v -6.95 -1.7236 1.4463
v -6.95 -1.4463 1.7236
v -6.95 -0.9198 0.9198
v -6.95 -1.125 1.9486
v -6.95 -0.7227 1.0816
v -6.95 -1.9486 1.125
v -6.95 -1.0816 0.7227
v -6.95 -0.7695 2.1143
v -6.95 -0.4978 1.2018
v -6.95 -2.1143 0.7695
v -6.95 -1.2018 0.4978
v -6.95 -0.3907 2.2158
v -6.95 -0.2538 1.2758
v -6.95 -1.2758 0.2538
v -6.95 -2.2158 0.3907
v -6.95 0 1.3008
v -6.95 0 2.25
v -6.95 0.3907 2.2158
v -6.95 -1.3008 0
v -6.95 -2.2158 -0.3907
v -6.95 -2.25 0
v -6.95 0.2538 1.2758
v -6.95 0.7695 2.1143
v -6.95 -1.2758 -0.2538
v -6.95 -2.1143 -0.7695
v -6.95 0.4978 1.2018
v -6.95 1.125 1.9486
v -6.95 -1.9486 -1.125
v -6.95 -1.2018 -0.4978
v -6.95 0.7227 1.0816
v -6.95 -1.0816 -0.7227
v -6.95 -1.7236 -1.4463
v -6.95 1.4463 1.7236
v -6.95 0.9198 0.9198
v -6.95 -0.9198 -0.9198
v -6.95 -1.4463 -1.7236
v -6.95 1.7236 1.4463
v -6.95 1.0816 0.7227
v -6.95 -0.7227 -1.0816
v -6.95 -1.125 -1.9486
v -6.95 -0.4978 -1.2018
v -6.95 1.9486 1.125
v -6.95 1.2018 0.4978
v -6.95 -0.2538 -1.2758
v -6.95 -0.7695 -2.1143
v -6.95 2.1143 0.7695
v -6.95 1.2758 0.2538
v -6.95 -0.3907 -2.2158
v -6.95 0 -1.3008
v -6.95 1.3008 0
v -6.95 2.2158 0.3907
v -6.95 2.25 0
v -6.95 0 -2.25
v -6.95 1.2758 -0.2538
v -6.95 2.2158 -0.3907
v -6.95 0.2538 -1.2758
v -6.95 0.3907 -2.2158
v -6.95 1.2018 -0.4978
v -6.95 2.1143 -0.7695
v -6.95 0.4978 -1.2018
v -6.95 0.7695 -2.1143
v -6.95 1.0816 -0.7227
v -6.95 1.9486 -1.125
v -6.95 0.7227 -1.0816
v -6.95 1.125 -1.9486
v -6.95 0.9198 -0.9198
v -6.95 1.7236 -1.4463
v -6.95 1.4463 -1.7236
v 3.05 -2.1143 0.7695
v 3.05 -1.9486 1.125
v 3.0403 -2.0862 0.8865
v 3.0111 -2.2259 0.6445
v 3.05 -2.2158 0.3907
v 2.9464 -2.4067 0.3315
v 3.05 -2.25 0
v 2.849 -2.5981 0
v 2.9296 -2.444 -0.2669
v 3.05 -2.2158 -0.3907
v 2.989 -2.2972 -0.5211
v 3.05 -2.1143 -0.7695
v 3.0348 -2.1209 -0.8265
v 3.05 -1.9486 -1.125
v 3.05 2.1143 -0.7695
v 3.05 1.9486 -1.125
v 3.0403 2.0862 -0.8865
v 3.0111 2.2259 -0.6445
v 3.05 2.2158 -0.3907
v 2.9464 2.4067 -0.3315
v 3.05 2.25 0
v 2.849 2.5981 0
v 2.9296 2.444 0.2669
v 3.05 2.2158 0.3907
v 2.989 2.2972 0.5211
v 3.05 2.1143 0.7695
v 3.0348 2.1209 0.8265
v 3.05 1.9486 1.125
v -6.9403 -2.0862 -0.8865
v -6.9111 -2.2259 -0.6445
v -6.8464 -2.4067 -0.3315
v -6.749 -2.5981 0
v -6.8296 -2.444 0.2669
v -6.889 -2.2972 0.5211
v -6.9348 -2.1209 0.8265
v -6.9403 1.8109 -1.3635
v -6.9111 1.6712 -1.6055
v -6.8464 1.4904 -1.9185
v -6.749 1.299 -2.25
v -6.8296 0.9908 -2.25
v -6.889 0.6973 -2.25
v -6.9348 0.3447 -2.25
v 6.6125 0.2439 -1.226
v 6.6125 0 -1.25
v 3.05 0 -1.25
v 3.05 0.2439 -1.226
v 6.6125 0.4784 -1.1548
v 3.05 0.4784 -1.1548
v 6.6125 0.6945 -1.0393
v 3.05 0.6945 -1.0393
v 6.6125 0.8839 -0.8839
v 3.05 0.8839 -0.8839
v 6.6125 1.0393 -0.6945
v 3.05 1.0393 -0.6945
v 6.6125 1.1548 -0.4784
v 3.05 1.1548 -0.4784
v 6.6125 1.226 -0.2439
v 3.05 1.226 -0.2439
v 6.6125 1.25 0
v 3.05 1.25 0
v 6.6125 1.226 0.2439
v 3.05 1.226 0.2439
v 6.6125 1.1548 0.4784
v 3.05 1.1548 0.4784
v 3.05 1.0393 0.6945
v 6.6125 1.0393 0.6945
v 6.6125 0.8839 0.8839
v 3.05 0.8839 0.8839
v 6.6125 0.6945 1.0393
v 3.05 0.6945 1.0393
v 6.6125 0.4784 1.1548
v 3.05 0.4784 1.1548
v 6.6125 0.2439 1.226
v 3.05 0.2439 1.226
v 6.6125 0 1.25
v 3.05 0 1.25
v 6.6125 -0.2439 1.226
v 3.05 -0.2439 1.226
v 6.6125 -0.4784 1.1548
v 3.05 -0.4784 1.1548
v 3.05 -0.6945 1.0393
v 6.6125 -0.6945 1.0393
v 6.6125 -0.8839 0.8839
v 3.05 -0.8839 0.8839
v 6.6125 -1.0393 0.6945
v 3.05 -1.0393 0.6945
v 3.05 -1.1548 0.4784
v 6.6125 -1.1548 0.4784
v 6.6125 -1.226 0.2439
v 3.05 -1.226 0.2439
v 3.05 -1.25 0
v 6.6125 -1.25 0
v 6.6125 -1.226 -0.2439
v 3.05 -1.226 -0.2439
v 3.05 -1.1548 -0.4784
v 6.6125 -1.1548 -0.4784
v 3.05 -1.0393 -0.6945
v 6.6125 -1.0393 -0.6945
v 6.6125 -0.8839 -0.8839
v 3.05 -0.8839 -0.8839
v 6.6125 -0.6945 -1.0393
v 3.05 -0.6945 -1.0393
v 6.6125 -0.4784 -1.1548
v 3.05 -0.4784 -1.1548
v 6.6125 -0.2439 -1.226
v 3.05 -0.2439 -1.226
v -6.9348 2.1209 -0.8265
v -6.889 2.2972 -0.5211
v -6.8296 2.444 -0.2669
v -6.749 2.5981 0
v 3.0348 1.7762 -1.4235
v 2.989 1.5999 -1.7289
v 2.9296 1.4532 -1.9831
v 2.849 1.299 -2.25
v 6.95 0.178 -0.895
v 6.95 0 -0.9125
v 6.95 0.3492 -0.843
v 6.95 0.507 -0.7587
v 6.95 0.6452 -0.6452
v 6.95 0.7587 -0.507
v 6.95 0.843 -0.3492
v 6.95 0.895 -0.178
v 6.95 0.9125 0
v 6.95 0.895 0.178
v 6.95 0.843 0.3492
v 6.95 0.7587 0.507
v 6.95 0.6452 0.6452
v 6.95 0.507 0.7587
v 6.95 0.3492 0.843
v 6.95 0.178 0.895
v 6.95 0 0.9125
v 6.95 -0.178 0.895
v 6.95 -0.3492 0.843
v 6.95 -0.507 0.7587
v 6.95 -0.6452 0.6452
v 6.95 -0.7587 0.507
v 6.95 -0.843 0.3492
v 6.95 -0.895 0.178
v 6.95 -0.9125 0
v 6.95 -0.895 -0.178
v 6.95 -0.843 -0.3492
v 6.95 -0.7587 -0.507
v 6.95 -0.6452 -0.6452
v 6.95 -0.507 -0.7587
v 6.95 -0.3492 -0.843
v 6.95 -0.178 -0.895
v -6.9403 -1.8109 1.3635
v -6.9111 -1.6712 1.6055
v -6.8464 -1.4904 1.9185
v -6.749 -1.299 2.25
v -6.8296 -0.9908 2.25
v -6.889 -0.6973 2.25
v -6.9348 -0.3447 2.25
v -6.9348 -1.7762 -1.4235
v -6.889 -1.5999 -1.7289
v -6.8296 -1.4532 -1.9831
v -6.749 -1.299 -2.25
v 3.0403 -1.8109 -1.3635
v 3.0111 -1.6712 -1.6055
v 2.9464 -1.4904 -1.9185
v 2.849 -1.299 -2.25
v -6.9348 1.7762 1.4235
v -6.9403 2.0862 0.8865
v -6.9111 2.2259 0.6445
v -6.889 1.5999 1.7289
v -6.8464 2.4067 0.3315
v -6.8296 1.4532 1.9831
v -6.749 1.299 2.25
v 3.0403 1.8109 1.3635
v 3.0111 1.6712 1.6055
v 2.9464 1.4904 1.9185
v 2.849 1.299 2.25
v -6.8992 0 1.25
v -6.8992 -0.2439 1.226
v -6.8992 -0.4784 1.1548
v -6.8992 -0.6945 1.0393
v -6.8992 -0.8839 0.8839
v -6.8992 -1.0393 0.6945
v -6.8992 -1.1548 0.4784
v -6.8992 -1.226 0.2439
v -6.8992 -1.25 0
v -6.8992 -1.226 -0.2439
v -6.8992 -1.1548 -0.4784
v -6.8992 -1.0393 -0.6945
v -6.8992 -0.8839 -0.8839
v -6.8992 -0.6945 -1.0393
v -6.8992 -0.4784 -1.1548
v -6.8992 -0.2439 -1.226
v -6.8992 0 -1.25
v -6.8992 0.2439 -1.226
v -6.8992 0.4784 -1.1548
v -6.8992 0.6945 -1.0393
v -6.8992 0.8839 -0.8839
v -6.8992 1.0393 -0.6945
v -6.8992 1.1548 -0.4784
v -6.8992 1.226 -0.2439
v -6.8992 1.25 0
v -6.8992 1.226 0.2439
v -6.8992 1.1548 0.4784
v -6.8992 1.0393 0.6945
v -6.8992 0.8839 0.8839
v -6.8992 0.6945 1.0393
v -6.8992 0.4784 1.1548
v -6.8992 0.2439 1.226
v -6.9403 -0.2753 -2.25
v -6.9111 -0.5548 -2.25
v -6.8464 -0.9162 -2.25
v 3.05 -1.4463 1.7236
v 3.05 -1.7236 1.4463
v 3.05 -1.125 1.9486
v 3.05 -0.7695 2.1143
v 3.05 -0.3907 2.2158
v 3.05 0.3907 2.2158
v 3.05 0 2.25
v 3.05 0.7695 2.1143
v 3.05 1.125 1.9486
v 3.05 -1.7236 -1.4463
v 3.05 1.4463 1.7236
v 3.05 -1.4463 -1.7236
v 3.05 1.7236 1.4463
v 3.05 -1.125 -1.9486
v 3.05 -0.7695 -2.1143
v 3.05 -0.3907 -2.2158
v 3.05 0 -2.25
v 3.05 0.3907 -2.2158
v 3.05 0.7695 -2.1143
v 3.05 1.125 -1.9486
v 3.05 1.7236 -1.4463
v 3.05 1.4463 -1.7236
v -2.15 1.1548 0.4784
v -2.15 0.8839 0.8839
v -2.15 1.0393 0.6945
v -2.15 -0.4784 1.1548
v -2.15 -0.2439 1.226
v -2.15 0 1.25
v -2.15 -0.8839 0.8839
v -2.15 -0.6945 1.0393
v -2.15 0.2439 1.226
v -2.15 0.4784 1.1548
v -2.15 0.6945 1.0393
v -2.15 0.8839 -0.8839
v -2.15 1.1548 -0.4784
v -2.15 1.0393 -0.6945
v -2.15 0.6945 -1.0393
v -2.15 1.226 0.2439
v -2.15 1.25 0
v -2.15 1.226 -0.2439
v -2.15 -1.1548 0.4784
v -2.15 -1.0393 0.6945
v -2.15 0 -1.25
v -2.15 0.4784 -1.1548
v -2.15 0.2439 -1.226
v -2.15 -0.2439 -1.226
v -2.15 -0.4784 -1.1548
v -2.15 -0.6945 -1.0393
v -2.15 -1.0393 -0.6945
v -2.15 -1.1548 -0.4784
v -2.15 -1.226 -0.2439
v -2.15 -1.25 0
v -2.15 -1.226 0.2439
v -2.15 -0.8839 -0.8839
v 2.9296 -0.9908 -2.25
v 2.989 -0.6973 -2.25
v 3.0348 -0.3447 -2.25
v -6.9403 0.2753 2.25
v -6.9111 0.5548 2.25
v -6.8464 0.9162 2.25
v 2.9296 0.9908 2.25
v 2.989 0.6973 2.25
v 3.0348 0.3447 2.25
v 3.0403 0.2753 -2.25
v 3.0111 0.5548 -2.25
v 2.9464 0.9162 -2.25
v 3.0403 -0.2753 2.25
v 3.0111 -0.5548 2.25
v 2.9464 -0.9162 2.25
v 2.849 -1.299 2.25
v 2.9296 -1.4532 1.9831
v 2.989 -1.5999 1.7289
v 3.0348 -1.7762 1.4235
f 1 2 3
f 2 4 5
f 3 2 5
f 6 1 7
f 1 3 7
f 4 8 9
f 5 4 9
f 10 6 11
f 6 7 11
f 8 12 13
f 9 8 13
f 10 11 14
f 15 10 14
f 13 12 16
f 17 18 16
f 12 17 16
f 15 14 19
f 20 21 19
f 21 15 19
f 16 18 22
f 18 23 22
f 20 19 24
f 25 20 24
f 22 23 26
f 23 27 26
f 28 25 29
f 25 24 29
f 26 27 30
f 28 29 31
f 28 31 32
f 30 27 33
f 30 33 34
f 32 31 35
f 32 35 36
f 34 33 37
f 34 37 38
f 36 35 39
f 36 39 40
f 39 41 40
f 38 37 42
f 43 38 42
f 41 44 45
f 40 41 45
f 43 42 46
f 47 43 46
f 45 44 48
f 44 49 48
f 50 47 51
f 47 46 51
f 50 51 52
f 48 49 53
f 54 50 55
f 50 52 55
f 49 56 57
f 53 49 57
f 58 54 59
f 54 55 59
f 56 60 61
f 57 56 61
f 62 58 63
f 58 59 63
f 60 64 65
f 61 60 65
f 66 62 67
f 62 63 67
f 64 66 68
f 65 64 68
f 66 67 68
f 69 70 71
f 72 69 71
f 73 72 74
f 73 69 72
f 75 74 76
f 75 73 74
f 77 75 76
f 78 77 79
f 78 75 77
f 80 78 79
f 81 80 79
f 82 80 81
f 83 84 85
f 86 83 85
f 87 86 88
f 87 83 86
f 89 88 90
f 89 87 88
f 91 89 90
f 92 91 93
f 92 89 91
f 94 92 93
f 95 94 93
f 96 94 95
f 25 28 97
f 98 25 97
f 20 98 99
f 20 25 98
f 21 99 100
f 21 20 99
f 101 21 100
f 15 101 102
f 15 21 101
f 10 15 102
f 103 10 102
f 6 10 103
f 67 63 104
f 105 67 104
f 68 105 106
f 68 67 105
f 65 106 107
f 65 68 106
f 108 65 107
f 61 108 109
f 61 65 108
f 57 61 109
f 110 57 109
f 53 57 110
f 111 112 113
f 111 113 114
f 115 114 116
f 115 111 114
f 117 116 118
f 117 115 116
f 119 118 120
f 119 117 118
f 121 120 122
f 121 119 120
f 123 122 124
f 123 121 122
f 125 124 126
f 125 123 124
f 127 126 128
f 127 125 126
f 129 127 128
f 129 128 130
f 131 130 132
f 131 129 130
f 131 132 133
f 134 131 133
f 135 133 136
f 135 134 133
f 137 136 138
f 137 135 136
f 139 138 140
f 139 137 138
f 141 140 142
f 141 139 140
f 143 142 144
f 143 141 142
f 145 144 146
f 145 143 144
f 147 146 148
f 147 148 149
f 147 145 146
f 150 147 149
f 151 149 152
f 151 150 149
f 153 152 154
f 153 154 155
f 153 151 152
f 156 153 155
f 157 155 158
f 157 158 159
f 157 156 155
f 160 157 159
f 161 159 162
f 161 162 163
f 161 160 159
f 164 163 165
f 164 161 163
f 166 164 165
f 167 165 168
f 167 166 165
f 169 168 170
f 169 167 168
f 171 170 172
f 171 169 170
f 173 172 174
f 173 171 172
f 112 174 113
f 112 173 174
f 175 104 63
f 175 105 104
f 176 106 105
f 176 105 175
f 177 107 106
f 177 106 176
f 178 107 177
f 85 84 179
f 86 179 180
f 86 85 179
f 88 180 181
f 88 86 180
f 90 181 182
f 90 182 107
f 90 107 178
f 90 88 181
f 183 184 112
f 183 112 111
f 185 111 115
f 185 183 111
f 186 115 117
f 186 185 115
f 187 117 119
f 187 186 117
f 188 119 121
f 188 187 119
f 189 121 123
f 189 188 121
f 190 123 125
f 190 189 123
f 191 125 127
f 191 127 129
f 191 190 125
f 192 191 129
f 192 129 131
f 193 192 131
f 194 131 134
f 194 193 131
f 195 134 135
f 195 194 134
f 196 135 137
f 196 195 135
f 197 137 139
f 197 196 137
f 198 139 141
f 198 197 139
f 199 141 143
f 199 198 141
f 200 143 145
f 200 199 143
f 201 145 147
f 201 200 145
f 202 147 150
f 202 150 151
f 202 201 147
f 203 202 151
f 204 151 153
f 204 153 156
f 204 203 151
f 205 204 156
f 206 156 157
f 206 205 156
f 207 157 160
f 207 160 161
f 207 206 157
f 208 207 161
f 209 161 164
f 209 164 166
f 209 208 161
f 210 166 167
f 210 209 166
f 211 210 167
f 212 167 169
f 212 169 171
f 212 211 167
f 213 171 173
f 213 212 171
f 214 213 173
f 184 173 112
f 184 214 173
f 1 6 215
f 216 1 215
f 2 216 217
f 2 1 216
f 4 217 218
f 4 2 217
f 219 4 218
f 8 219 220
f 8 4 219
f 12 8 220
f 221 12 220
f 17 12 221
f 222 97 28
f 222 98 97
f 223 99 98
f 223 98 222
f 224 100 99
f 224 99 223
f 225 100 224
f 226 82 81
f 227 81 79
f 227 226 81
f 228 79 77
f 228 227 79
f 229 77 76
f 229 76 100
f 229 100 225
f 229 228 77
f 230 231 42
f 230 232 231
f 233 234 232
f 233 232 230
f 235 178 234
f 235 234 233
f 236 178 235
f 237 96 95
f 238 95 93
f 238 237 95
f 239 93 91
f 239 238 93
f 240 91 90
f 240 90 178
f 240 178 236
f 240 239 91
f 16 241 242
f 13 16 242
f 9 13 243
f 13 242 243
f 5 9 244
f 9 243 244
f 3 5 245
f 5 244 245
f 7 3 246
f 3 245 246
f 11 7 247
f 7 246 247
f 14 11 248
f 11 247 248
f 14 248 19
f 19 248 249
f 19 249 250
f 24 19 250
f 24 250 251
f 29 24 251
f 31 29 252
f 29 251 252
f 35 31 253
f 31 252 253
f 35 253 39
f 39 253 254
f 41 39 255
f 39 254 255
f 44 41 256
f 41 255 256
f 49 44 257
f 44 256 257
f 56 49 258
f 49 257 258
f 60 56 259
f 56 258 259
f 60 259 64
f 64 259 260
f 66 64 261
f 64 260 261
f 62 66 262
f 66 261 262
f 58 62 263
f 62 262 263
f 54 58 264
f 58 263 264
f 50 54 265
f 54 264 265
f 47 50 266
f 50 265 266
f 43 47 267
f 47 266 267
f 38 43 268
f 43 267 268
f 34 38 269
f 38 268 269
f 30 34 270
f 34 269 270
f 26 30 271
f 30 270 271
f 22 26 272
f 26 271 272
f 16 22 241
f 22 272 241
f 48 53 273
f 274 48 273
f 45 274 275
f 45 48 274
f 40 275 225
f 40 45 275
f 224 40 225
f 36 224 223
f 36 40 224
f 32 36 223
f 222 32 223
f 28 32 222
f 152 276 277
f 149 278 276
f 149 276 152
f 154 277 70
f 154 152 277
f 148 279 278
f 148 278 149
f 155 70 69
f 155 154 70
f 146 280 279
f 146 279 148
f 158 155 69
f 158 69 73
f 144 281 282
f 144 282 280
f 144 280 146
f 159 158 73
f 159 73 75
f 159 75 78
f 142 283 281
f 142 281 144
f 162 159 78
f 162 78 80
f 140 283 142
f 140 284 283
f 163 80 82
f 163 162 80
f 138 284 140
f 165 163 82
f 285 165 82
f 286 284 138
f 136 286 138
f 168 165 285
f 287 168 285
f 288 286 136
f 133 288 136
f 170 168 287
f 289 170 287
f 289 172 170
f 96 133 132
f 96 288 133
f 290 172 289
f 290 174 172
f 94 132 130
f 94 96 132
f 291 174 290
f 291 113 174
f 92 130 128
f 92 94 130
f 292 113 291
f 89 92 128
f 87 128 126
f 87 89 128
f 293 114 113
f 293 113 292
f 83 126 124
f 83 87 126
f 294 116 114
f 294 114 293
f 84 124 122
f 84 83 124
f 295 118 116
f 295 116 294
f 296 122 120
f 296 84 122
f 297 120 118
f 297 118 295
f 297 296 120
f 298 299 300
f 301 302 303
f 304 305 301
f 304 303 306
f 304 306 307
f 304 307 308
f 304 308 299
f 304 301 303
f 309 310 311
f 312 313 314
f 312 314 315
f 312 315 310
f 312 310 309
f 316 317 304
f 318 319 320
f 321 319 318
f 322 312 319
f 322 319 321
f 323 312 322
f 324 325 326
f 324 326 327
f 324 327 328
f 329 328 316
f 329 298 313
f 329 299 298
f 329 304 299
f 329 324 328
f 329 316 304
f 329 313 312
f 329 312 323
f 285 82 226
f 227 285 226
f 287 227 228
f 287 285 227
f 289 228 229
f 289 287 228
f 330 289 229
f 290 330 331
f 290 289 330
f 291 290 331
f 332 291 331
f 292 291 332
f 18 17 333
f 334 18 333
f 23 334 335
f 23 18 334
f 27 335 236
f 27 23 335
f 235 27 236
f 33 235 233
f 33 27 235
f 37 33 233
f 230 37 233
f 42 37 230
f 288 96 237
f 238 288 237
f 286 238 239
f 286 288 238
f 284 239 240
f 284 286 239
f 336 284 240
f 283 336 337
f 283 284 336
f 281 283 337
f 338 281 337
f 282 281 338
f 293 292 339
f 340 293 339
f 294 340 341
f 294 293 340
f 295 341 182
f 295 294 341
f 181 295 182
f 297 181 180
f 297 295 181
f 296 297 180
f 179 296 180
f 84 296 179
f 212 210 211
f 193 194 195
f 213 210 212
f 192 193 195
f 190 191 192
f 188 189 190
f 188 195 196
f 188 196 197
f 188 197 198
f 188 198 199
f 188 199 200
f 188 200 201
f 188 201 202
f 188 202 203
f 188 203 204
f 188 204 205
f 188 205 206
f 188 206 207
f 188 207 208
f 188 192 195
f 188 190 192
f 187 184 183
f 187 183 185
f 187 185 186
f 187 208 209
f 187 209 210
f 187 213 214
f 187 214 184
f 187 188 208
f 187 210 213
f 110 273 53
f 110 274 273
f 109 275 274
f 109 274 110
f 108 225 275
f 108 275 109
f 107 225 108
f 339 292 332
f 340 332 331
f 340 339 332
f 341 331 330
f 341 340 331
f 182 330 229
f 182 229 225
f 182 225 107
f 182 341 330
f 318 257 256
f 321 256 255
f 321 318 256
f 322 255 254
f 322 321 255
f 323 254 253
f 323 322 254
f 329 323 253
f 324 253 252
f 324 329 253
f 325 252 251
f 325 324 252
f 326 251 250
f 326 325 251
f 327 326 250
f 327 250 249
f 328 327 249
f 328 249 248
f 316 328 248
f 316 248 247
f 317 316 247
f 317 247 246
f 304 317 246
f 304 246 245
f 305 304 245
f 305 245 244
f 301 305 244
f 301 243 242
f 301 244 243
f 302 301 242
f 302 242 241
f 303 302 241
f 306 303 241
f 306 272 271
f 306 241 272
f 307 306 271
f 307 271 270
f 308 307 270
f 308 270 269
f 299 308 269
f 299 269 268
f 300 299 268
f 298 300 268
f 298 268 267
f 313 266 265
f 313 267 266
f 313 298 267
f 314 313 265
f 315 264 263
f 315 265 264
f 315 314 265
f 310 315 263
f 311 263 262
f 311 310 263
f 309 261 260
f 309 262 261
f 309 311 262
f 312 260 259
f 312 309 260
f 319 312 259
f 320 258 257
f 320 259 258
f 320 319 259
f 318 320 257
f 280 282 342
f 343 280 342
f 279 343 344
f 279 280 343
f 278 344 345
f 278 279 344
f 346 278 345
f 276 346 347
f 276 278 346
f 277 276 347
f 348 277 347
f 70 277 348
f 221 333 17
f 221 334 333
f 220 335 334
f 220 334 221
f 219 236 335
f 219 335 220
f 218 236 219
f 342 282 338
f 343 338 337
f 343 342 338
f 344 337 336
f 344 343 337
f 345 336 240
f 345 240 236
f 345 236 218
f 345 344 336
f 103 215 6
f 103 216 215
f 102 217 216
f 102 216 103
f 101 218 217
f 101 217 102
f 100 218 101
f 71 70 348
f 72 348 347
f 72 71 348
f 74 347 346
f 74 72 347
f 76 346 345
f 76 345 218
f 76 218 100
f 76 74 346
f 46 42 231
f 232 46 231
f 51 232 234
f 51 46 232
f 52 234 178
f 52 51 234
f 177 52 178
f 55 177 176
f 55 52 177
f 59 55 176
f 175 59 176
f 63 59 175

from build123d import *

# Parameters (mm, degrees)
SKETCH2_R         = 1.25
EXTRUDE1_DEPTH    = 3.9
CHAMFER1_SIZE     = 0.3375
EXTRUDE4_DEPTH    = 10
SKETCH8_OUTSIDE_W = 62.666
SKETCH8_OUTSIDE_H = 63.362
SKETCH8_OUTSIDE_R = 2.25
EXTRUDE5_DEPTH    = 15.318606776
EXTRUDE5_DRAFT    = -60
SKETCH9_OUTSIDE_W = 49.696
SKETCH9_OUTSIDE_H = 50.392
SKETCH9_OUTSIDE_R = 2.25
EXTRUDE6_DEPTH    = 11.574142991
EXTRUDE6_DRAFT    = -60
EXTRUDE7_START    = -4.8
SKETCH10_R        = 1.25
EXTRUDE7_DEPTH    = 4.8
SKETCH13_R        = 1.3008
EXTRUDE8_DEPTH    = 15.318606776


with BuildPart() as part:
    # Sketch2 → Extrude1 (new body)
    with BuildSketch(Plane(origin=(6.95, 0, 0), x_dir=(0, 0, -1), z_dir=(1, 0, 0))):
        Circle(SKETCH2_R)
    extrude(amount=-EXTRUDE1_DEPTH)

    # Chamfer1
    chamfer1_edges = [part.edges().sort_by_distance(p)[0] for p in [
        (6.95, 0, 1.25),
    ]]
    chamfer(chamfer1_edges, length=CHAMFER1_SIZE)

    # Sketch7 → Extrude4 (add)
    with BuildSketch(Plane(origin=(3.05, 0, 0), x_dir=(0, 0, -1), z_dir=(1, 0, 0))):
        Polygon((0, 2.598076211), (-2.25, 1.299038106), (-2.25, -1.299038106), (0, -2.598076211), (2.25, -1.299038106), (2.25, 1.299038106), align=None)
    extrude(amount=-EXTRUDE4_DEPTH)


with BuildPart() as extrude5_tool:
    # Sketch8 outside → Extrude5 (with draft: the straight prism first)
    with BuildSketch(Plane.ZY.offset(6.95)):
        Rectangle(SKETCH8_OUTSIDE_W, SKETCH8_OUTSIDE_H)
        Circle(SKETCH8_OUTSIDE_R, mode=Mode.SUBTRACT)
    extrude(amount=-EXTRUDE5_DEPTH)
    # Extrude5: the draft: its side faces are tilted about the plane it starts from
    extrude5_sides = [extrude5_tool.faces().sort_by_distance(p)[0] for p in [
        (0.709303388, -31.681, 0),
        (0.709303388, 0, 31.333),
        (0.709303388, 31.681, 0),
        (0.709303388, 0, -31.333),
        (0.709303388, 0, -2.25),
    ]]
    draft(extrude5_sides, Plane.ZY.offset(6.95), EXTRUDE5_DRAFT)


with BuildPart() as part_1:
    add(part.part)

    # Extrude5: cut by extrude5_tool
    add(extrude5_tool.part, mode=Mode.SUBTRACT)


with BuildPart() as extrude6_tool:
    # Sketch9 outside → Extrude6 (with draft: the straight prism first)
    with BuildSketch(Plane(origin=(3.05, 0, 0), x_dir=(0, 0, -1), z_dir=(1, 0, 0))):
        Rectangle(SKETCH9_OUTSIDE_W, SKETCH9_OUTSIDE_H)
        Circle(SKETCH9_OUTSIDE_R, mode=Mode.SUBTRACT)
    extrude(amount=-EXTRUDE6_DEPTH)
    # Extrude6: the draft: its side faces are tilted about the plane it starts from
    extrude6_sides = [extrude6_tool.faces().sort_by_distance(p)[0] for p in [
        (-2.737071496, -25.196, 0),
        (-2.737071496, 0, -24.848),
        (-2.737071496, 25.196, 0),
        (-2.737071496, 0, 24.848),
        (-2.737071496, 0, 2.25),
    ]]
    draft(extrude6_sides, Plane(origin=(3.05, 0, 0), x_dir=(0, 0, -1), z_dir=(1, 0, 0)), EXTRUDE6_DRAFT)


with BuildPart() as part_2:
    add(part_1.part)

    # Extrude6: cut by extrude6_tool
    add(extrude6_tool.part, mode=Mode.SUBTRACT)

    # Sketch10 → Extrude7 (cut)
    with BuildSketch(Plane.ZY.offset(6.95).offset(EXTRUDE7_START)):
        with Locations(Location((0, 0, 0), (0, 0, 180))):
            Circle(SKETCH10_R)
    extrude(amount=EXTRUDE7_DEPTH, mode=Mode.SUBTRACT)

    # Sketch13 → Extrude8 (cut)
    with BuildSketch(Plane.ZY.offset(6.95)):
        Circle(SKETCH13_R)
    extrude(amount=EXTRUDE8_DEPTH, mode=Mode.SUBTRACT)

    # Extrude8 cone 1 section (through the dimple's axis) → Extrude8 other way (revolve, cut)
    with BuildSketch(Plane(origin=(-6.95, 0, 0), x_dir=(0, 0, 1), z_dir=(0, 1, 0))):
        Polygon((0, 0), (1.3008, 0), (0, 1.3008), align=None)
    revolve(axis=Axis((-6.95, 0, 0), (1, 0, 0)), mode=Mode.SUBTRACT)


solid = part_2.part
